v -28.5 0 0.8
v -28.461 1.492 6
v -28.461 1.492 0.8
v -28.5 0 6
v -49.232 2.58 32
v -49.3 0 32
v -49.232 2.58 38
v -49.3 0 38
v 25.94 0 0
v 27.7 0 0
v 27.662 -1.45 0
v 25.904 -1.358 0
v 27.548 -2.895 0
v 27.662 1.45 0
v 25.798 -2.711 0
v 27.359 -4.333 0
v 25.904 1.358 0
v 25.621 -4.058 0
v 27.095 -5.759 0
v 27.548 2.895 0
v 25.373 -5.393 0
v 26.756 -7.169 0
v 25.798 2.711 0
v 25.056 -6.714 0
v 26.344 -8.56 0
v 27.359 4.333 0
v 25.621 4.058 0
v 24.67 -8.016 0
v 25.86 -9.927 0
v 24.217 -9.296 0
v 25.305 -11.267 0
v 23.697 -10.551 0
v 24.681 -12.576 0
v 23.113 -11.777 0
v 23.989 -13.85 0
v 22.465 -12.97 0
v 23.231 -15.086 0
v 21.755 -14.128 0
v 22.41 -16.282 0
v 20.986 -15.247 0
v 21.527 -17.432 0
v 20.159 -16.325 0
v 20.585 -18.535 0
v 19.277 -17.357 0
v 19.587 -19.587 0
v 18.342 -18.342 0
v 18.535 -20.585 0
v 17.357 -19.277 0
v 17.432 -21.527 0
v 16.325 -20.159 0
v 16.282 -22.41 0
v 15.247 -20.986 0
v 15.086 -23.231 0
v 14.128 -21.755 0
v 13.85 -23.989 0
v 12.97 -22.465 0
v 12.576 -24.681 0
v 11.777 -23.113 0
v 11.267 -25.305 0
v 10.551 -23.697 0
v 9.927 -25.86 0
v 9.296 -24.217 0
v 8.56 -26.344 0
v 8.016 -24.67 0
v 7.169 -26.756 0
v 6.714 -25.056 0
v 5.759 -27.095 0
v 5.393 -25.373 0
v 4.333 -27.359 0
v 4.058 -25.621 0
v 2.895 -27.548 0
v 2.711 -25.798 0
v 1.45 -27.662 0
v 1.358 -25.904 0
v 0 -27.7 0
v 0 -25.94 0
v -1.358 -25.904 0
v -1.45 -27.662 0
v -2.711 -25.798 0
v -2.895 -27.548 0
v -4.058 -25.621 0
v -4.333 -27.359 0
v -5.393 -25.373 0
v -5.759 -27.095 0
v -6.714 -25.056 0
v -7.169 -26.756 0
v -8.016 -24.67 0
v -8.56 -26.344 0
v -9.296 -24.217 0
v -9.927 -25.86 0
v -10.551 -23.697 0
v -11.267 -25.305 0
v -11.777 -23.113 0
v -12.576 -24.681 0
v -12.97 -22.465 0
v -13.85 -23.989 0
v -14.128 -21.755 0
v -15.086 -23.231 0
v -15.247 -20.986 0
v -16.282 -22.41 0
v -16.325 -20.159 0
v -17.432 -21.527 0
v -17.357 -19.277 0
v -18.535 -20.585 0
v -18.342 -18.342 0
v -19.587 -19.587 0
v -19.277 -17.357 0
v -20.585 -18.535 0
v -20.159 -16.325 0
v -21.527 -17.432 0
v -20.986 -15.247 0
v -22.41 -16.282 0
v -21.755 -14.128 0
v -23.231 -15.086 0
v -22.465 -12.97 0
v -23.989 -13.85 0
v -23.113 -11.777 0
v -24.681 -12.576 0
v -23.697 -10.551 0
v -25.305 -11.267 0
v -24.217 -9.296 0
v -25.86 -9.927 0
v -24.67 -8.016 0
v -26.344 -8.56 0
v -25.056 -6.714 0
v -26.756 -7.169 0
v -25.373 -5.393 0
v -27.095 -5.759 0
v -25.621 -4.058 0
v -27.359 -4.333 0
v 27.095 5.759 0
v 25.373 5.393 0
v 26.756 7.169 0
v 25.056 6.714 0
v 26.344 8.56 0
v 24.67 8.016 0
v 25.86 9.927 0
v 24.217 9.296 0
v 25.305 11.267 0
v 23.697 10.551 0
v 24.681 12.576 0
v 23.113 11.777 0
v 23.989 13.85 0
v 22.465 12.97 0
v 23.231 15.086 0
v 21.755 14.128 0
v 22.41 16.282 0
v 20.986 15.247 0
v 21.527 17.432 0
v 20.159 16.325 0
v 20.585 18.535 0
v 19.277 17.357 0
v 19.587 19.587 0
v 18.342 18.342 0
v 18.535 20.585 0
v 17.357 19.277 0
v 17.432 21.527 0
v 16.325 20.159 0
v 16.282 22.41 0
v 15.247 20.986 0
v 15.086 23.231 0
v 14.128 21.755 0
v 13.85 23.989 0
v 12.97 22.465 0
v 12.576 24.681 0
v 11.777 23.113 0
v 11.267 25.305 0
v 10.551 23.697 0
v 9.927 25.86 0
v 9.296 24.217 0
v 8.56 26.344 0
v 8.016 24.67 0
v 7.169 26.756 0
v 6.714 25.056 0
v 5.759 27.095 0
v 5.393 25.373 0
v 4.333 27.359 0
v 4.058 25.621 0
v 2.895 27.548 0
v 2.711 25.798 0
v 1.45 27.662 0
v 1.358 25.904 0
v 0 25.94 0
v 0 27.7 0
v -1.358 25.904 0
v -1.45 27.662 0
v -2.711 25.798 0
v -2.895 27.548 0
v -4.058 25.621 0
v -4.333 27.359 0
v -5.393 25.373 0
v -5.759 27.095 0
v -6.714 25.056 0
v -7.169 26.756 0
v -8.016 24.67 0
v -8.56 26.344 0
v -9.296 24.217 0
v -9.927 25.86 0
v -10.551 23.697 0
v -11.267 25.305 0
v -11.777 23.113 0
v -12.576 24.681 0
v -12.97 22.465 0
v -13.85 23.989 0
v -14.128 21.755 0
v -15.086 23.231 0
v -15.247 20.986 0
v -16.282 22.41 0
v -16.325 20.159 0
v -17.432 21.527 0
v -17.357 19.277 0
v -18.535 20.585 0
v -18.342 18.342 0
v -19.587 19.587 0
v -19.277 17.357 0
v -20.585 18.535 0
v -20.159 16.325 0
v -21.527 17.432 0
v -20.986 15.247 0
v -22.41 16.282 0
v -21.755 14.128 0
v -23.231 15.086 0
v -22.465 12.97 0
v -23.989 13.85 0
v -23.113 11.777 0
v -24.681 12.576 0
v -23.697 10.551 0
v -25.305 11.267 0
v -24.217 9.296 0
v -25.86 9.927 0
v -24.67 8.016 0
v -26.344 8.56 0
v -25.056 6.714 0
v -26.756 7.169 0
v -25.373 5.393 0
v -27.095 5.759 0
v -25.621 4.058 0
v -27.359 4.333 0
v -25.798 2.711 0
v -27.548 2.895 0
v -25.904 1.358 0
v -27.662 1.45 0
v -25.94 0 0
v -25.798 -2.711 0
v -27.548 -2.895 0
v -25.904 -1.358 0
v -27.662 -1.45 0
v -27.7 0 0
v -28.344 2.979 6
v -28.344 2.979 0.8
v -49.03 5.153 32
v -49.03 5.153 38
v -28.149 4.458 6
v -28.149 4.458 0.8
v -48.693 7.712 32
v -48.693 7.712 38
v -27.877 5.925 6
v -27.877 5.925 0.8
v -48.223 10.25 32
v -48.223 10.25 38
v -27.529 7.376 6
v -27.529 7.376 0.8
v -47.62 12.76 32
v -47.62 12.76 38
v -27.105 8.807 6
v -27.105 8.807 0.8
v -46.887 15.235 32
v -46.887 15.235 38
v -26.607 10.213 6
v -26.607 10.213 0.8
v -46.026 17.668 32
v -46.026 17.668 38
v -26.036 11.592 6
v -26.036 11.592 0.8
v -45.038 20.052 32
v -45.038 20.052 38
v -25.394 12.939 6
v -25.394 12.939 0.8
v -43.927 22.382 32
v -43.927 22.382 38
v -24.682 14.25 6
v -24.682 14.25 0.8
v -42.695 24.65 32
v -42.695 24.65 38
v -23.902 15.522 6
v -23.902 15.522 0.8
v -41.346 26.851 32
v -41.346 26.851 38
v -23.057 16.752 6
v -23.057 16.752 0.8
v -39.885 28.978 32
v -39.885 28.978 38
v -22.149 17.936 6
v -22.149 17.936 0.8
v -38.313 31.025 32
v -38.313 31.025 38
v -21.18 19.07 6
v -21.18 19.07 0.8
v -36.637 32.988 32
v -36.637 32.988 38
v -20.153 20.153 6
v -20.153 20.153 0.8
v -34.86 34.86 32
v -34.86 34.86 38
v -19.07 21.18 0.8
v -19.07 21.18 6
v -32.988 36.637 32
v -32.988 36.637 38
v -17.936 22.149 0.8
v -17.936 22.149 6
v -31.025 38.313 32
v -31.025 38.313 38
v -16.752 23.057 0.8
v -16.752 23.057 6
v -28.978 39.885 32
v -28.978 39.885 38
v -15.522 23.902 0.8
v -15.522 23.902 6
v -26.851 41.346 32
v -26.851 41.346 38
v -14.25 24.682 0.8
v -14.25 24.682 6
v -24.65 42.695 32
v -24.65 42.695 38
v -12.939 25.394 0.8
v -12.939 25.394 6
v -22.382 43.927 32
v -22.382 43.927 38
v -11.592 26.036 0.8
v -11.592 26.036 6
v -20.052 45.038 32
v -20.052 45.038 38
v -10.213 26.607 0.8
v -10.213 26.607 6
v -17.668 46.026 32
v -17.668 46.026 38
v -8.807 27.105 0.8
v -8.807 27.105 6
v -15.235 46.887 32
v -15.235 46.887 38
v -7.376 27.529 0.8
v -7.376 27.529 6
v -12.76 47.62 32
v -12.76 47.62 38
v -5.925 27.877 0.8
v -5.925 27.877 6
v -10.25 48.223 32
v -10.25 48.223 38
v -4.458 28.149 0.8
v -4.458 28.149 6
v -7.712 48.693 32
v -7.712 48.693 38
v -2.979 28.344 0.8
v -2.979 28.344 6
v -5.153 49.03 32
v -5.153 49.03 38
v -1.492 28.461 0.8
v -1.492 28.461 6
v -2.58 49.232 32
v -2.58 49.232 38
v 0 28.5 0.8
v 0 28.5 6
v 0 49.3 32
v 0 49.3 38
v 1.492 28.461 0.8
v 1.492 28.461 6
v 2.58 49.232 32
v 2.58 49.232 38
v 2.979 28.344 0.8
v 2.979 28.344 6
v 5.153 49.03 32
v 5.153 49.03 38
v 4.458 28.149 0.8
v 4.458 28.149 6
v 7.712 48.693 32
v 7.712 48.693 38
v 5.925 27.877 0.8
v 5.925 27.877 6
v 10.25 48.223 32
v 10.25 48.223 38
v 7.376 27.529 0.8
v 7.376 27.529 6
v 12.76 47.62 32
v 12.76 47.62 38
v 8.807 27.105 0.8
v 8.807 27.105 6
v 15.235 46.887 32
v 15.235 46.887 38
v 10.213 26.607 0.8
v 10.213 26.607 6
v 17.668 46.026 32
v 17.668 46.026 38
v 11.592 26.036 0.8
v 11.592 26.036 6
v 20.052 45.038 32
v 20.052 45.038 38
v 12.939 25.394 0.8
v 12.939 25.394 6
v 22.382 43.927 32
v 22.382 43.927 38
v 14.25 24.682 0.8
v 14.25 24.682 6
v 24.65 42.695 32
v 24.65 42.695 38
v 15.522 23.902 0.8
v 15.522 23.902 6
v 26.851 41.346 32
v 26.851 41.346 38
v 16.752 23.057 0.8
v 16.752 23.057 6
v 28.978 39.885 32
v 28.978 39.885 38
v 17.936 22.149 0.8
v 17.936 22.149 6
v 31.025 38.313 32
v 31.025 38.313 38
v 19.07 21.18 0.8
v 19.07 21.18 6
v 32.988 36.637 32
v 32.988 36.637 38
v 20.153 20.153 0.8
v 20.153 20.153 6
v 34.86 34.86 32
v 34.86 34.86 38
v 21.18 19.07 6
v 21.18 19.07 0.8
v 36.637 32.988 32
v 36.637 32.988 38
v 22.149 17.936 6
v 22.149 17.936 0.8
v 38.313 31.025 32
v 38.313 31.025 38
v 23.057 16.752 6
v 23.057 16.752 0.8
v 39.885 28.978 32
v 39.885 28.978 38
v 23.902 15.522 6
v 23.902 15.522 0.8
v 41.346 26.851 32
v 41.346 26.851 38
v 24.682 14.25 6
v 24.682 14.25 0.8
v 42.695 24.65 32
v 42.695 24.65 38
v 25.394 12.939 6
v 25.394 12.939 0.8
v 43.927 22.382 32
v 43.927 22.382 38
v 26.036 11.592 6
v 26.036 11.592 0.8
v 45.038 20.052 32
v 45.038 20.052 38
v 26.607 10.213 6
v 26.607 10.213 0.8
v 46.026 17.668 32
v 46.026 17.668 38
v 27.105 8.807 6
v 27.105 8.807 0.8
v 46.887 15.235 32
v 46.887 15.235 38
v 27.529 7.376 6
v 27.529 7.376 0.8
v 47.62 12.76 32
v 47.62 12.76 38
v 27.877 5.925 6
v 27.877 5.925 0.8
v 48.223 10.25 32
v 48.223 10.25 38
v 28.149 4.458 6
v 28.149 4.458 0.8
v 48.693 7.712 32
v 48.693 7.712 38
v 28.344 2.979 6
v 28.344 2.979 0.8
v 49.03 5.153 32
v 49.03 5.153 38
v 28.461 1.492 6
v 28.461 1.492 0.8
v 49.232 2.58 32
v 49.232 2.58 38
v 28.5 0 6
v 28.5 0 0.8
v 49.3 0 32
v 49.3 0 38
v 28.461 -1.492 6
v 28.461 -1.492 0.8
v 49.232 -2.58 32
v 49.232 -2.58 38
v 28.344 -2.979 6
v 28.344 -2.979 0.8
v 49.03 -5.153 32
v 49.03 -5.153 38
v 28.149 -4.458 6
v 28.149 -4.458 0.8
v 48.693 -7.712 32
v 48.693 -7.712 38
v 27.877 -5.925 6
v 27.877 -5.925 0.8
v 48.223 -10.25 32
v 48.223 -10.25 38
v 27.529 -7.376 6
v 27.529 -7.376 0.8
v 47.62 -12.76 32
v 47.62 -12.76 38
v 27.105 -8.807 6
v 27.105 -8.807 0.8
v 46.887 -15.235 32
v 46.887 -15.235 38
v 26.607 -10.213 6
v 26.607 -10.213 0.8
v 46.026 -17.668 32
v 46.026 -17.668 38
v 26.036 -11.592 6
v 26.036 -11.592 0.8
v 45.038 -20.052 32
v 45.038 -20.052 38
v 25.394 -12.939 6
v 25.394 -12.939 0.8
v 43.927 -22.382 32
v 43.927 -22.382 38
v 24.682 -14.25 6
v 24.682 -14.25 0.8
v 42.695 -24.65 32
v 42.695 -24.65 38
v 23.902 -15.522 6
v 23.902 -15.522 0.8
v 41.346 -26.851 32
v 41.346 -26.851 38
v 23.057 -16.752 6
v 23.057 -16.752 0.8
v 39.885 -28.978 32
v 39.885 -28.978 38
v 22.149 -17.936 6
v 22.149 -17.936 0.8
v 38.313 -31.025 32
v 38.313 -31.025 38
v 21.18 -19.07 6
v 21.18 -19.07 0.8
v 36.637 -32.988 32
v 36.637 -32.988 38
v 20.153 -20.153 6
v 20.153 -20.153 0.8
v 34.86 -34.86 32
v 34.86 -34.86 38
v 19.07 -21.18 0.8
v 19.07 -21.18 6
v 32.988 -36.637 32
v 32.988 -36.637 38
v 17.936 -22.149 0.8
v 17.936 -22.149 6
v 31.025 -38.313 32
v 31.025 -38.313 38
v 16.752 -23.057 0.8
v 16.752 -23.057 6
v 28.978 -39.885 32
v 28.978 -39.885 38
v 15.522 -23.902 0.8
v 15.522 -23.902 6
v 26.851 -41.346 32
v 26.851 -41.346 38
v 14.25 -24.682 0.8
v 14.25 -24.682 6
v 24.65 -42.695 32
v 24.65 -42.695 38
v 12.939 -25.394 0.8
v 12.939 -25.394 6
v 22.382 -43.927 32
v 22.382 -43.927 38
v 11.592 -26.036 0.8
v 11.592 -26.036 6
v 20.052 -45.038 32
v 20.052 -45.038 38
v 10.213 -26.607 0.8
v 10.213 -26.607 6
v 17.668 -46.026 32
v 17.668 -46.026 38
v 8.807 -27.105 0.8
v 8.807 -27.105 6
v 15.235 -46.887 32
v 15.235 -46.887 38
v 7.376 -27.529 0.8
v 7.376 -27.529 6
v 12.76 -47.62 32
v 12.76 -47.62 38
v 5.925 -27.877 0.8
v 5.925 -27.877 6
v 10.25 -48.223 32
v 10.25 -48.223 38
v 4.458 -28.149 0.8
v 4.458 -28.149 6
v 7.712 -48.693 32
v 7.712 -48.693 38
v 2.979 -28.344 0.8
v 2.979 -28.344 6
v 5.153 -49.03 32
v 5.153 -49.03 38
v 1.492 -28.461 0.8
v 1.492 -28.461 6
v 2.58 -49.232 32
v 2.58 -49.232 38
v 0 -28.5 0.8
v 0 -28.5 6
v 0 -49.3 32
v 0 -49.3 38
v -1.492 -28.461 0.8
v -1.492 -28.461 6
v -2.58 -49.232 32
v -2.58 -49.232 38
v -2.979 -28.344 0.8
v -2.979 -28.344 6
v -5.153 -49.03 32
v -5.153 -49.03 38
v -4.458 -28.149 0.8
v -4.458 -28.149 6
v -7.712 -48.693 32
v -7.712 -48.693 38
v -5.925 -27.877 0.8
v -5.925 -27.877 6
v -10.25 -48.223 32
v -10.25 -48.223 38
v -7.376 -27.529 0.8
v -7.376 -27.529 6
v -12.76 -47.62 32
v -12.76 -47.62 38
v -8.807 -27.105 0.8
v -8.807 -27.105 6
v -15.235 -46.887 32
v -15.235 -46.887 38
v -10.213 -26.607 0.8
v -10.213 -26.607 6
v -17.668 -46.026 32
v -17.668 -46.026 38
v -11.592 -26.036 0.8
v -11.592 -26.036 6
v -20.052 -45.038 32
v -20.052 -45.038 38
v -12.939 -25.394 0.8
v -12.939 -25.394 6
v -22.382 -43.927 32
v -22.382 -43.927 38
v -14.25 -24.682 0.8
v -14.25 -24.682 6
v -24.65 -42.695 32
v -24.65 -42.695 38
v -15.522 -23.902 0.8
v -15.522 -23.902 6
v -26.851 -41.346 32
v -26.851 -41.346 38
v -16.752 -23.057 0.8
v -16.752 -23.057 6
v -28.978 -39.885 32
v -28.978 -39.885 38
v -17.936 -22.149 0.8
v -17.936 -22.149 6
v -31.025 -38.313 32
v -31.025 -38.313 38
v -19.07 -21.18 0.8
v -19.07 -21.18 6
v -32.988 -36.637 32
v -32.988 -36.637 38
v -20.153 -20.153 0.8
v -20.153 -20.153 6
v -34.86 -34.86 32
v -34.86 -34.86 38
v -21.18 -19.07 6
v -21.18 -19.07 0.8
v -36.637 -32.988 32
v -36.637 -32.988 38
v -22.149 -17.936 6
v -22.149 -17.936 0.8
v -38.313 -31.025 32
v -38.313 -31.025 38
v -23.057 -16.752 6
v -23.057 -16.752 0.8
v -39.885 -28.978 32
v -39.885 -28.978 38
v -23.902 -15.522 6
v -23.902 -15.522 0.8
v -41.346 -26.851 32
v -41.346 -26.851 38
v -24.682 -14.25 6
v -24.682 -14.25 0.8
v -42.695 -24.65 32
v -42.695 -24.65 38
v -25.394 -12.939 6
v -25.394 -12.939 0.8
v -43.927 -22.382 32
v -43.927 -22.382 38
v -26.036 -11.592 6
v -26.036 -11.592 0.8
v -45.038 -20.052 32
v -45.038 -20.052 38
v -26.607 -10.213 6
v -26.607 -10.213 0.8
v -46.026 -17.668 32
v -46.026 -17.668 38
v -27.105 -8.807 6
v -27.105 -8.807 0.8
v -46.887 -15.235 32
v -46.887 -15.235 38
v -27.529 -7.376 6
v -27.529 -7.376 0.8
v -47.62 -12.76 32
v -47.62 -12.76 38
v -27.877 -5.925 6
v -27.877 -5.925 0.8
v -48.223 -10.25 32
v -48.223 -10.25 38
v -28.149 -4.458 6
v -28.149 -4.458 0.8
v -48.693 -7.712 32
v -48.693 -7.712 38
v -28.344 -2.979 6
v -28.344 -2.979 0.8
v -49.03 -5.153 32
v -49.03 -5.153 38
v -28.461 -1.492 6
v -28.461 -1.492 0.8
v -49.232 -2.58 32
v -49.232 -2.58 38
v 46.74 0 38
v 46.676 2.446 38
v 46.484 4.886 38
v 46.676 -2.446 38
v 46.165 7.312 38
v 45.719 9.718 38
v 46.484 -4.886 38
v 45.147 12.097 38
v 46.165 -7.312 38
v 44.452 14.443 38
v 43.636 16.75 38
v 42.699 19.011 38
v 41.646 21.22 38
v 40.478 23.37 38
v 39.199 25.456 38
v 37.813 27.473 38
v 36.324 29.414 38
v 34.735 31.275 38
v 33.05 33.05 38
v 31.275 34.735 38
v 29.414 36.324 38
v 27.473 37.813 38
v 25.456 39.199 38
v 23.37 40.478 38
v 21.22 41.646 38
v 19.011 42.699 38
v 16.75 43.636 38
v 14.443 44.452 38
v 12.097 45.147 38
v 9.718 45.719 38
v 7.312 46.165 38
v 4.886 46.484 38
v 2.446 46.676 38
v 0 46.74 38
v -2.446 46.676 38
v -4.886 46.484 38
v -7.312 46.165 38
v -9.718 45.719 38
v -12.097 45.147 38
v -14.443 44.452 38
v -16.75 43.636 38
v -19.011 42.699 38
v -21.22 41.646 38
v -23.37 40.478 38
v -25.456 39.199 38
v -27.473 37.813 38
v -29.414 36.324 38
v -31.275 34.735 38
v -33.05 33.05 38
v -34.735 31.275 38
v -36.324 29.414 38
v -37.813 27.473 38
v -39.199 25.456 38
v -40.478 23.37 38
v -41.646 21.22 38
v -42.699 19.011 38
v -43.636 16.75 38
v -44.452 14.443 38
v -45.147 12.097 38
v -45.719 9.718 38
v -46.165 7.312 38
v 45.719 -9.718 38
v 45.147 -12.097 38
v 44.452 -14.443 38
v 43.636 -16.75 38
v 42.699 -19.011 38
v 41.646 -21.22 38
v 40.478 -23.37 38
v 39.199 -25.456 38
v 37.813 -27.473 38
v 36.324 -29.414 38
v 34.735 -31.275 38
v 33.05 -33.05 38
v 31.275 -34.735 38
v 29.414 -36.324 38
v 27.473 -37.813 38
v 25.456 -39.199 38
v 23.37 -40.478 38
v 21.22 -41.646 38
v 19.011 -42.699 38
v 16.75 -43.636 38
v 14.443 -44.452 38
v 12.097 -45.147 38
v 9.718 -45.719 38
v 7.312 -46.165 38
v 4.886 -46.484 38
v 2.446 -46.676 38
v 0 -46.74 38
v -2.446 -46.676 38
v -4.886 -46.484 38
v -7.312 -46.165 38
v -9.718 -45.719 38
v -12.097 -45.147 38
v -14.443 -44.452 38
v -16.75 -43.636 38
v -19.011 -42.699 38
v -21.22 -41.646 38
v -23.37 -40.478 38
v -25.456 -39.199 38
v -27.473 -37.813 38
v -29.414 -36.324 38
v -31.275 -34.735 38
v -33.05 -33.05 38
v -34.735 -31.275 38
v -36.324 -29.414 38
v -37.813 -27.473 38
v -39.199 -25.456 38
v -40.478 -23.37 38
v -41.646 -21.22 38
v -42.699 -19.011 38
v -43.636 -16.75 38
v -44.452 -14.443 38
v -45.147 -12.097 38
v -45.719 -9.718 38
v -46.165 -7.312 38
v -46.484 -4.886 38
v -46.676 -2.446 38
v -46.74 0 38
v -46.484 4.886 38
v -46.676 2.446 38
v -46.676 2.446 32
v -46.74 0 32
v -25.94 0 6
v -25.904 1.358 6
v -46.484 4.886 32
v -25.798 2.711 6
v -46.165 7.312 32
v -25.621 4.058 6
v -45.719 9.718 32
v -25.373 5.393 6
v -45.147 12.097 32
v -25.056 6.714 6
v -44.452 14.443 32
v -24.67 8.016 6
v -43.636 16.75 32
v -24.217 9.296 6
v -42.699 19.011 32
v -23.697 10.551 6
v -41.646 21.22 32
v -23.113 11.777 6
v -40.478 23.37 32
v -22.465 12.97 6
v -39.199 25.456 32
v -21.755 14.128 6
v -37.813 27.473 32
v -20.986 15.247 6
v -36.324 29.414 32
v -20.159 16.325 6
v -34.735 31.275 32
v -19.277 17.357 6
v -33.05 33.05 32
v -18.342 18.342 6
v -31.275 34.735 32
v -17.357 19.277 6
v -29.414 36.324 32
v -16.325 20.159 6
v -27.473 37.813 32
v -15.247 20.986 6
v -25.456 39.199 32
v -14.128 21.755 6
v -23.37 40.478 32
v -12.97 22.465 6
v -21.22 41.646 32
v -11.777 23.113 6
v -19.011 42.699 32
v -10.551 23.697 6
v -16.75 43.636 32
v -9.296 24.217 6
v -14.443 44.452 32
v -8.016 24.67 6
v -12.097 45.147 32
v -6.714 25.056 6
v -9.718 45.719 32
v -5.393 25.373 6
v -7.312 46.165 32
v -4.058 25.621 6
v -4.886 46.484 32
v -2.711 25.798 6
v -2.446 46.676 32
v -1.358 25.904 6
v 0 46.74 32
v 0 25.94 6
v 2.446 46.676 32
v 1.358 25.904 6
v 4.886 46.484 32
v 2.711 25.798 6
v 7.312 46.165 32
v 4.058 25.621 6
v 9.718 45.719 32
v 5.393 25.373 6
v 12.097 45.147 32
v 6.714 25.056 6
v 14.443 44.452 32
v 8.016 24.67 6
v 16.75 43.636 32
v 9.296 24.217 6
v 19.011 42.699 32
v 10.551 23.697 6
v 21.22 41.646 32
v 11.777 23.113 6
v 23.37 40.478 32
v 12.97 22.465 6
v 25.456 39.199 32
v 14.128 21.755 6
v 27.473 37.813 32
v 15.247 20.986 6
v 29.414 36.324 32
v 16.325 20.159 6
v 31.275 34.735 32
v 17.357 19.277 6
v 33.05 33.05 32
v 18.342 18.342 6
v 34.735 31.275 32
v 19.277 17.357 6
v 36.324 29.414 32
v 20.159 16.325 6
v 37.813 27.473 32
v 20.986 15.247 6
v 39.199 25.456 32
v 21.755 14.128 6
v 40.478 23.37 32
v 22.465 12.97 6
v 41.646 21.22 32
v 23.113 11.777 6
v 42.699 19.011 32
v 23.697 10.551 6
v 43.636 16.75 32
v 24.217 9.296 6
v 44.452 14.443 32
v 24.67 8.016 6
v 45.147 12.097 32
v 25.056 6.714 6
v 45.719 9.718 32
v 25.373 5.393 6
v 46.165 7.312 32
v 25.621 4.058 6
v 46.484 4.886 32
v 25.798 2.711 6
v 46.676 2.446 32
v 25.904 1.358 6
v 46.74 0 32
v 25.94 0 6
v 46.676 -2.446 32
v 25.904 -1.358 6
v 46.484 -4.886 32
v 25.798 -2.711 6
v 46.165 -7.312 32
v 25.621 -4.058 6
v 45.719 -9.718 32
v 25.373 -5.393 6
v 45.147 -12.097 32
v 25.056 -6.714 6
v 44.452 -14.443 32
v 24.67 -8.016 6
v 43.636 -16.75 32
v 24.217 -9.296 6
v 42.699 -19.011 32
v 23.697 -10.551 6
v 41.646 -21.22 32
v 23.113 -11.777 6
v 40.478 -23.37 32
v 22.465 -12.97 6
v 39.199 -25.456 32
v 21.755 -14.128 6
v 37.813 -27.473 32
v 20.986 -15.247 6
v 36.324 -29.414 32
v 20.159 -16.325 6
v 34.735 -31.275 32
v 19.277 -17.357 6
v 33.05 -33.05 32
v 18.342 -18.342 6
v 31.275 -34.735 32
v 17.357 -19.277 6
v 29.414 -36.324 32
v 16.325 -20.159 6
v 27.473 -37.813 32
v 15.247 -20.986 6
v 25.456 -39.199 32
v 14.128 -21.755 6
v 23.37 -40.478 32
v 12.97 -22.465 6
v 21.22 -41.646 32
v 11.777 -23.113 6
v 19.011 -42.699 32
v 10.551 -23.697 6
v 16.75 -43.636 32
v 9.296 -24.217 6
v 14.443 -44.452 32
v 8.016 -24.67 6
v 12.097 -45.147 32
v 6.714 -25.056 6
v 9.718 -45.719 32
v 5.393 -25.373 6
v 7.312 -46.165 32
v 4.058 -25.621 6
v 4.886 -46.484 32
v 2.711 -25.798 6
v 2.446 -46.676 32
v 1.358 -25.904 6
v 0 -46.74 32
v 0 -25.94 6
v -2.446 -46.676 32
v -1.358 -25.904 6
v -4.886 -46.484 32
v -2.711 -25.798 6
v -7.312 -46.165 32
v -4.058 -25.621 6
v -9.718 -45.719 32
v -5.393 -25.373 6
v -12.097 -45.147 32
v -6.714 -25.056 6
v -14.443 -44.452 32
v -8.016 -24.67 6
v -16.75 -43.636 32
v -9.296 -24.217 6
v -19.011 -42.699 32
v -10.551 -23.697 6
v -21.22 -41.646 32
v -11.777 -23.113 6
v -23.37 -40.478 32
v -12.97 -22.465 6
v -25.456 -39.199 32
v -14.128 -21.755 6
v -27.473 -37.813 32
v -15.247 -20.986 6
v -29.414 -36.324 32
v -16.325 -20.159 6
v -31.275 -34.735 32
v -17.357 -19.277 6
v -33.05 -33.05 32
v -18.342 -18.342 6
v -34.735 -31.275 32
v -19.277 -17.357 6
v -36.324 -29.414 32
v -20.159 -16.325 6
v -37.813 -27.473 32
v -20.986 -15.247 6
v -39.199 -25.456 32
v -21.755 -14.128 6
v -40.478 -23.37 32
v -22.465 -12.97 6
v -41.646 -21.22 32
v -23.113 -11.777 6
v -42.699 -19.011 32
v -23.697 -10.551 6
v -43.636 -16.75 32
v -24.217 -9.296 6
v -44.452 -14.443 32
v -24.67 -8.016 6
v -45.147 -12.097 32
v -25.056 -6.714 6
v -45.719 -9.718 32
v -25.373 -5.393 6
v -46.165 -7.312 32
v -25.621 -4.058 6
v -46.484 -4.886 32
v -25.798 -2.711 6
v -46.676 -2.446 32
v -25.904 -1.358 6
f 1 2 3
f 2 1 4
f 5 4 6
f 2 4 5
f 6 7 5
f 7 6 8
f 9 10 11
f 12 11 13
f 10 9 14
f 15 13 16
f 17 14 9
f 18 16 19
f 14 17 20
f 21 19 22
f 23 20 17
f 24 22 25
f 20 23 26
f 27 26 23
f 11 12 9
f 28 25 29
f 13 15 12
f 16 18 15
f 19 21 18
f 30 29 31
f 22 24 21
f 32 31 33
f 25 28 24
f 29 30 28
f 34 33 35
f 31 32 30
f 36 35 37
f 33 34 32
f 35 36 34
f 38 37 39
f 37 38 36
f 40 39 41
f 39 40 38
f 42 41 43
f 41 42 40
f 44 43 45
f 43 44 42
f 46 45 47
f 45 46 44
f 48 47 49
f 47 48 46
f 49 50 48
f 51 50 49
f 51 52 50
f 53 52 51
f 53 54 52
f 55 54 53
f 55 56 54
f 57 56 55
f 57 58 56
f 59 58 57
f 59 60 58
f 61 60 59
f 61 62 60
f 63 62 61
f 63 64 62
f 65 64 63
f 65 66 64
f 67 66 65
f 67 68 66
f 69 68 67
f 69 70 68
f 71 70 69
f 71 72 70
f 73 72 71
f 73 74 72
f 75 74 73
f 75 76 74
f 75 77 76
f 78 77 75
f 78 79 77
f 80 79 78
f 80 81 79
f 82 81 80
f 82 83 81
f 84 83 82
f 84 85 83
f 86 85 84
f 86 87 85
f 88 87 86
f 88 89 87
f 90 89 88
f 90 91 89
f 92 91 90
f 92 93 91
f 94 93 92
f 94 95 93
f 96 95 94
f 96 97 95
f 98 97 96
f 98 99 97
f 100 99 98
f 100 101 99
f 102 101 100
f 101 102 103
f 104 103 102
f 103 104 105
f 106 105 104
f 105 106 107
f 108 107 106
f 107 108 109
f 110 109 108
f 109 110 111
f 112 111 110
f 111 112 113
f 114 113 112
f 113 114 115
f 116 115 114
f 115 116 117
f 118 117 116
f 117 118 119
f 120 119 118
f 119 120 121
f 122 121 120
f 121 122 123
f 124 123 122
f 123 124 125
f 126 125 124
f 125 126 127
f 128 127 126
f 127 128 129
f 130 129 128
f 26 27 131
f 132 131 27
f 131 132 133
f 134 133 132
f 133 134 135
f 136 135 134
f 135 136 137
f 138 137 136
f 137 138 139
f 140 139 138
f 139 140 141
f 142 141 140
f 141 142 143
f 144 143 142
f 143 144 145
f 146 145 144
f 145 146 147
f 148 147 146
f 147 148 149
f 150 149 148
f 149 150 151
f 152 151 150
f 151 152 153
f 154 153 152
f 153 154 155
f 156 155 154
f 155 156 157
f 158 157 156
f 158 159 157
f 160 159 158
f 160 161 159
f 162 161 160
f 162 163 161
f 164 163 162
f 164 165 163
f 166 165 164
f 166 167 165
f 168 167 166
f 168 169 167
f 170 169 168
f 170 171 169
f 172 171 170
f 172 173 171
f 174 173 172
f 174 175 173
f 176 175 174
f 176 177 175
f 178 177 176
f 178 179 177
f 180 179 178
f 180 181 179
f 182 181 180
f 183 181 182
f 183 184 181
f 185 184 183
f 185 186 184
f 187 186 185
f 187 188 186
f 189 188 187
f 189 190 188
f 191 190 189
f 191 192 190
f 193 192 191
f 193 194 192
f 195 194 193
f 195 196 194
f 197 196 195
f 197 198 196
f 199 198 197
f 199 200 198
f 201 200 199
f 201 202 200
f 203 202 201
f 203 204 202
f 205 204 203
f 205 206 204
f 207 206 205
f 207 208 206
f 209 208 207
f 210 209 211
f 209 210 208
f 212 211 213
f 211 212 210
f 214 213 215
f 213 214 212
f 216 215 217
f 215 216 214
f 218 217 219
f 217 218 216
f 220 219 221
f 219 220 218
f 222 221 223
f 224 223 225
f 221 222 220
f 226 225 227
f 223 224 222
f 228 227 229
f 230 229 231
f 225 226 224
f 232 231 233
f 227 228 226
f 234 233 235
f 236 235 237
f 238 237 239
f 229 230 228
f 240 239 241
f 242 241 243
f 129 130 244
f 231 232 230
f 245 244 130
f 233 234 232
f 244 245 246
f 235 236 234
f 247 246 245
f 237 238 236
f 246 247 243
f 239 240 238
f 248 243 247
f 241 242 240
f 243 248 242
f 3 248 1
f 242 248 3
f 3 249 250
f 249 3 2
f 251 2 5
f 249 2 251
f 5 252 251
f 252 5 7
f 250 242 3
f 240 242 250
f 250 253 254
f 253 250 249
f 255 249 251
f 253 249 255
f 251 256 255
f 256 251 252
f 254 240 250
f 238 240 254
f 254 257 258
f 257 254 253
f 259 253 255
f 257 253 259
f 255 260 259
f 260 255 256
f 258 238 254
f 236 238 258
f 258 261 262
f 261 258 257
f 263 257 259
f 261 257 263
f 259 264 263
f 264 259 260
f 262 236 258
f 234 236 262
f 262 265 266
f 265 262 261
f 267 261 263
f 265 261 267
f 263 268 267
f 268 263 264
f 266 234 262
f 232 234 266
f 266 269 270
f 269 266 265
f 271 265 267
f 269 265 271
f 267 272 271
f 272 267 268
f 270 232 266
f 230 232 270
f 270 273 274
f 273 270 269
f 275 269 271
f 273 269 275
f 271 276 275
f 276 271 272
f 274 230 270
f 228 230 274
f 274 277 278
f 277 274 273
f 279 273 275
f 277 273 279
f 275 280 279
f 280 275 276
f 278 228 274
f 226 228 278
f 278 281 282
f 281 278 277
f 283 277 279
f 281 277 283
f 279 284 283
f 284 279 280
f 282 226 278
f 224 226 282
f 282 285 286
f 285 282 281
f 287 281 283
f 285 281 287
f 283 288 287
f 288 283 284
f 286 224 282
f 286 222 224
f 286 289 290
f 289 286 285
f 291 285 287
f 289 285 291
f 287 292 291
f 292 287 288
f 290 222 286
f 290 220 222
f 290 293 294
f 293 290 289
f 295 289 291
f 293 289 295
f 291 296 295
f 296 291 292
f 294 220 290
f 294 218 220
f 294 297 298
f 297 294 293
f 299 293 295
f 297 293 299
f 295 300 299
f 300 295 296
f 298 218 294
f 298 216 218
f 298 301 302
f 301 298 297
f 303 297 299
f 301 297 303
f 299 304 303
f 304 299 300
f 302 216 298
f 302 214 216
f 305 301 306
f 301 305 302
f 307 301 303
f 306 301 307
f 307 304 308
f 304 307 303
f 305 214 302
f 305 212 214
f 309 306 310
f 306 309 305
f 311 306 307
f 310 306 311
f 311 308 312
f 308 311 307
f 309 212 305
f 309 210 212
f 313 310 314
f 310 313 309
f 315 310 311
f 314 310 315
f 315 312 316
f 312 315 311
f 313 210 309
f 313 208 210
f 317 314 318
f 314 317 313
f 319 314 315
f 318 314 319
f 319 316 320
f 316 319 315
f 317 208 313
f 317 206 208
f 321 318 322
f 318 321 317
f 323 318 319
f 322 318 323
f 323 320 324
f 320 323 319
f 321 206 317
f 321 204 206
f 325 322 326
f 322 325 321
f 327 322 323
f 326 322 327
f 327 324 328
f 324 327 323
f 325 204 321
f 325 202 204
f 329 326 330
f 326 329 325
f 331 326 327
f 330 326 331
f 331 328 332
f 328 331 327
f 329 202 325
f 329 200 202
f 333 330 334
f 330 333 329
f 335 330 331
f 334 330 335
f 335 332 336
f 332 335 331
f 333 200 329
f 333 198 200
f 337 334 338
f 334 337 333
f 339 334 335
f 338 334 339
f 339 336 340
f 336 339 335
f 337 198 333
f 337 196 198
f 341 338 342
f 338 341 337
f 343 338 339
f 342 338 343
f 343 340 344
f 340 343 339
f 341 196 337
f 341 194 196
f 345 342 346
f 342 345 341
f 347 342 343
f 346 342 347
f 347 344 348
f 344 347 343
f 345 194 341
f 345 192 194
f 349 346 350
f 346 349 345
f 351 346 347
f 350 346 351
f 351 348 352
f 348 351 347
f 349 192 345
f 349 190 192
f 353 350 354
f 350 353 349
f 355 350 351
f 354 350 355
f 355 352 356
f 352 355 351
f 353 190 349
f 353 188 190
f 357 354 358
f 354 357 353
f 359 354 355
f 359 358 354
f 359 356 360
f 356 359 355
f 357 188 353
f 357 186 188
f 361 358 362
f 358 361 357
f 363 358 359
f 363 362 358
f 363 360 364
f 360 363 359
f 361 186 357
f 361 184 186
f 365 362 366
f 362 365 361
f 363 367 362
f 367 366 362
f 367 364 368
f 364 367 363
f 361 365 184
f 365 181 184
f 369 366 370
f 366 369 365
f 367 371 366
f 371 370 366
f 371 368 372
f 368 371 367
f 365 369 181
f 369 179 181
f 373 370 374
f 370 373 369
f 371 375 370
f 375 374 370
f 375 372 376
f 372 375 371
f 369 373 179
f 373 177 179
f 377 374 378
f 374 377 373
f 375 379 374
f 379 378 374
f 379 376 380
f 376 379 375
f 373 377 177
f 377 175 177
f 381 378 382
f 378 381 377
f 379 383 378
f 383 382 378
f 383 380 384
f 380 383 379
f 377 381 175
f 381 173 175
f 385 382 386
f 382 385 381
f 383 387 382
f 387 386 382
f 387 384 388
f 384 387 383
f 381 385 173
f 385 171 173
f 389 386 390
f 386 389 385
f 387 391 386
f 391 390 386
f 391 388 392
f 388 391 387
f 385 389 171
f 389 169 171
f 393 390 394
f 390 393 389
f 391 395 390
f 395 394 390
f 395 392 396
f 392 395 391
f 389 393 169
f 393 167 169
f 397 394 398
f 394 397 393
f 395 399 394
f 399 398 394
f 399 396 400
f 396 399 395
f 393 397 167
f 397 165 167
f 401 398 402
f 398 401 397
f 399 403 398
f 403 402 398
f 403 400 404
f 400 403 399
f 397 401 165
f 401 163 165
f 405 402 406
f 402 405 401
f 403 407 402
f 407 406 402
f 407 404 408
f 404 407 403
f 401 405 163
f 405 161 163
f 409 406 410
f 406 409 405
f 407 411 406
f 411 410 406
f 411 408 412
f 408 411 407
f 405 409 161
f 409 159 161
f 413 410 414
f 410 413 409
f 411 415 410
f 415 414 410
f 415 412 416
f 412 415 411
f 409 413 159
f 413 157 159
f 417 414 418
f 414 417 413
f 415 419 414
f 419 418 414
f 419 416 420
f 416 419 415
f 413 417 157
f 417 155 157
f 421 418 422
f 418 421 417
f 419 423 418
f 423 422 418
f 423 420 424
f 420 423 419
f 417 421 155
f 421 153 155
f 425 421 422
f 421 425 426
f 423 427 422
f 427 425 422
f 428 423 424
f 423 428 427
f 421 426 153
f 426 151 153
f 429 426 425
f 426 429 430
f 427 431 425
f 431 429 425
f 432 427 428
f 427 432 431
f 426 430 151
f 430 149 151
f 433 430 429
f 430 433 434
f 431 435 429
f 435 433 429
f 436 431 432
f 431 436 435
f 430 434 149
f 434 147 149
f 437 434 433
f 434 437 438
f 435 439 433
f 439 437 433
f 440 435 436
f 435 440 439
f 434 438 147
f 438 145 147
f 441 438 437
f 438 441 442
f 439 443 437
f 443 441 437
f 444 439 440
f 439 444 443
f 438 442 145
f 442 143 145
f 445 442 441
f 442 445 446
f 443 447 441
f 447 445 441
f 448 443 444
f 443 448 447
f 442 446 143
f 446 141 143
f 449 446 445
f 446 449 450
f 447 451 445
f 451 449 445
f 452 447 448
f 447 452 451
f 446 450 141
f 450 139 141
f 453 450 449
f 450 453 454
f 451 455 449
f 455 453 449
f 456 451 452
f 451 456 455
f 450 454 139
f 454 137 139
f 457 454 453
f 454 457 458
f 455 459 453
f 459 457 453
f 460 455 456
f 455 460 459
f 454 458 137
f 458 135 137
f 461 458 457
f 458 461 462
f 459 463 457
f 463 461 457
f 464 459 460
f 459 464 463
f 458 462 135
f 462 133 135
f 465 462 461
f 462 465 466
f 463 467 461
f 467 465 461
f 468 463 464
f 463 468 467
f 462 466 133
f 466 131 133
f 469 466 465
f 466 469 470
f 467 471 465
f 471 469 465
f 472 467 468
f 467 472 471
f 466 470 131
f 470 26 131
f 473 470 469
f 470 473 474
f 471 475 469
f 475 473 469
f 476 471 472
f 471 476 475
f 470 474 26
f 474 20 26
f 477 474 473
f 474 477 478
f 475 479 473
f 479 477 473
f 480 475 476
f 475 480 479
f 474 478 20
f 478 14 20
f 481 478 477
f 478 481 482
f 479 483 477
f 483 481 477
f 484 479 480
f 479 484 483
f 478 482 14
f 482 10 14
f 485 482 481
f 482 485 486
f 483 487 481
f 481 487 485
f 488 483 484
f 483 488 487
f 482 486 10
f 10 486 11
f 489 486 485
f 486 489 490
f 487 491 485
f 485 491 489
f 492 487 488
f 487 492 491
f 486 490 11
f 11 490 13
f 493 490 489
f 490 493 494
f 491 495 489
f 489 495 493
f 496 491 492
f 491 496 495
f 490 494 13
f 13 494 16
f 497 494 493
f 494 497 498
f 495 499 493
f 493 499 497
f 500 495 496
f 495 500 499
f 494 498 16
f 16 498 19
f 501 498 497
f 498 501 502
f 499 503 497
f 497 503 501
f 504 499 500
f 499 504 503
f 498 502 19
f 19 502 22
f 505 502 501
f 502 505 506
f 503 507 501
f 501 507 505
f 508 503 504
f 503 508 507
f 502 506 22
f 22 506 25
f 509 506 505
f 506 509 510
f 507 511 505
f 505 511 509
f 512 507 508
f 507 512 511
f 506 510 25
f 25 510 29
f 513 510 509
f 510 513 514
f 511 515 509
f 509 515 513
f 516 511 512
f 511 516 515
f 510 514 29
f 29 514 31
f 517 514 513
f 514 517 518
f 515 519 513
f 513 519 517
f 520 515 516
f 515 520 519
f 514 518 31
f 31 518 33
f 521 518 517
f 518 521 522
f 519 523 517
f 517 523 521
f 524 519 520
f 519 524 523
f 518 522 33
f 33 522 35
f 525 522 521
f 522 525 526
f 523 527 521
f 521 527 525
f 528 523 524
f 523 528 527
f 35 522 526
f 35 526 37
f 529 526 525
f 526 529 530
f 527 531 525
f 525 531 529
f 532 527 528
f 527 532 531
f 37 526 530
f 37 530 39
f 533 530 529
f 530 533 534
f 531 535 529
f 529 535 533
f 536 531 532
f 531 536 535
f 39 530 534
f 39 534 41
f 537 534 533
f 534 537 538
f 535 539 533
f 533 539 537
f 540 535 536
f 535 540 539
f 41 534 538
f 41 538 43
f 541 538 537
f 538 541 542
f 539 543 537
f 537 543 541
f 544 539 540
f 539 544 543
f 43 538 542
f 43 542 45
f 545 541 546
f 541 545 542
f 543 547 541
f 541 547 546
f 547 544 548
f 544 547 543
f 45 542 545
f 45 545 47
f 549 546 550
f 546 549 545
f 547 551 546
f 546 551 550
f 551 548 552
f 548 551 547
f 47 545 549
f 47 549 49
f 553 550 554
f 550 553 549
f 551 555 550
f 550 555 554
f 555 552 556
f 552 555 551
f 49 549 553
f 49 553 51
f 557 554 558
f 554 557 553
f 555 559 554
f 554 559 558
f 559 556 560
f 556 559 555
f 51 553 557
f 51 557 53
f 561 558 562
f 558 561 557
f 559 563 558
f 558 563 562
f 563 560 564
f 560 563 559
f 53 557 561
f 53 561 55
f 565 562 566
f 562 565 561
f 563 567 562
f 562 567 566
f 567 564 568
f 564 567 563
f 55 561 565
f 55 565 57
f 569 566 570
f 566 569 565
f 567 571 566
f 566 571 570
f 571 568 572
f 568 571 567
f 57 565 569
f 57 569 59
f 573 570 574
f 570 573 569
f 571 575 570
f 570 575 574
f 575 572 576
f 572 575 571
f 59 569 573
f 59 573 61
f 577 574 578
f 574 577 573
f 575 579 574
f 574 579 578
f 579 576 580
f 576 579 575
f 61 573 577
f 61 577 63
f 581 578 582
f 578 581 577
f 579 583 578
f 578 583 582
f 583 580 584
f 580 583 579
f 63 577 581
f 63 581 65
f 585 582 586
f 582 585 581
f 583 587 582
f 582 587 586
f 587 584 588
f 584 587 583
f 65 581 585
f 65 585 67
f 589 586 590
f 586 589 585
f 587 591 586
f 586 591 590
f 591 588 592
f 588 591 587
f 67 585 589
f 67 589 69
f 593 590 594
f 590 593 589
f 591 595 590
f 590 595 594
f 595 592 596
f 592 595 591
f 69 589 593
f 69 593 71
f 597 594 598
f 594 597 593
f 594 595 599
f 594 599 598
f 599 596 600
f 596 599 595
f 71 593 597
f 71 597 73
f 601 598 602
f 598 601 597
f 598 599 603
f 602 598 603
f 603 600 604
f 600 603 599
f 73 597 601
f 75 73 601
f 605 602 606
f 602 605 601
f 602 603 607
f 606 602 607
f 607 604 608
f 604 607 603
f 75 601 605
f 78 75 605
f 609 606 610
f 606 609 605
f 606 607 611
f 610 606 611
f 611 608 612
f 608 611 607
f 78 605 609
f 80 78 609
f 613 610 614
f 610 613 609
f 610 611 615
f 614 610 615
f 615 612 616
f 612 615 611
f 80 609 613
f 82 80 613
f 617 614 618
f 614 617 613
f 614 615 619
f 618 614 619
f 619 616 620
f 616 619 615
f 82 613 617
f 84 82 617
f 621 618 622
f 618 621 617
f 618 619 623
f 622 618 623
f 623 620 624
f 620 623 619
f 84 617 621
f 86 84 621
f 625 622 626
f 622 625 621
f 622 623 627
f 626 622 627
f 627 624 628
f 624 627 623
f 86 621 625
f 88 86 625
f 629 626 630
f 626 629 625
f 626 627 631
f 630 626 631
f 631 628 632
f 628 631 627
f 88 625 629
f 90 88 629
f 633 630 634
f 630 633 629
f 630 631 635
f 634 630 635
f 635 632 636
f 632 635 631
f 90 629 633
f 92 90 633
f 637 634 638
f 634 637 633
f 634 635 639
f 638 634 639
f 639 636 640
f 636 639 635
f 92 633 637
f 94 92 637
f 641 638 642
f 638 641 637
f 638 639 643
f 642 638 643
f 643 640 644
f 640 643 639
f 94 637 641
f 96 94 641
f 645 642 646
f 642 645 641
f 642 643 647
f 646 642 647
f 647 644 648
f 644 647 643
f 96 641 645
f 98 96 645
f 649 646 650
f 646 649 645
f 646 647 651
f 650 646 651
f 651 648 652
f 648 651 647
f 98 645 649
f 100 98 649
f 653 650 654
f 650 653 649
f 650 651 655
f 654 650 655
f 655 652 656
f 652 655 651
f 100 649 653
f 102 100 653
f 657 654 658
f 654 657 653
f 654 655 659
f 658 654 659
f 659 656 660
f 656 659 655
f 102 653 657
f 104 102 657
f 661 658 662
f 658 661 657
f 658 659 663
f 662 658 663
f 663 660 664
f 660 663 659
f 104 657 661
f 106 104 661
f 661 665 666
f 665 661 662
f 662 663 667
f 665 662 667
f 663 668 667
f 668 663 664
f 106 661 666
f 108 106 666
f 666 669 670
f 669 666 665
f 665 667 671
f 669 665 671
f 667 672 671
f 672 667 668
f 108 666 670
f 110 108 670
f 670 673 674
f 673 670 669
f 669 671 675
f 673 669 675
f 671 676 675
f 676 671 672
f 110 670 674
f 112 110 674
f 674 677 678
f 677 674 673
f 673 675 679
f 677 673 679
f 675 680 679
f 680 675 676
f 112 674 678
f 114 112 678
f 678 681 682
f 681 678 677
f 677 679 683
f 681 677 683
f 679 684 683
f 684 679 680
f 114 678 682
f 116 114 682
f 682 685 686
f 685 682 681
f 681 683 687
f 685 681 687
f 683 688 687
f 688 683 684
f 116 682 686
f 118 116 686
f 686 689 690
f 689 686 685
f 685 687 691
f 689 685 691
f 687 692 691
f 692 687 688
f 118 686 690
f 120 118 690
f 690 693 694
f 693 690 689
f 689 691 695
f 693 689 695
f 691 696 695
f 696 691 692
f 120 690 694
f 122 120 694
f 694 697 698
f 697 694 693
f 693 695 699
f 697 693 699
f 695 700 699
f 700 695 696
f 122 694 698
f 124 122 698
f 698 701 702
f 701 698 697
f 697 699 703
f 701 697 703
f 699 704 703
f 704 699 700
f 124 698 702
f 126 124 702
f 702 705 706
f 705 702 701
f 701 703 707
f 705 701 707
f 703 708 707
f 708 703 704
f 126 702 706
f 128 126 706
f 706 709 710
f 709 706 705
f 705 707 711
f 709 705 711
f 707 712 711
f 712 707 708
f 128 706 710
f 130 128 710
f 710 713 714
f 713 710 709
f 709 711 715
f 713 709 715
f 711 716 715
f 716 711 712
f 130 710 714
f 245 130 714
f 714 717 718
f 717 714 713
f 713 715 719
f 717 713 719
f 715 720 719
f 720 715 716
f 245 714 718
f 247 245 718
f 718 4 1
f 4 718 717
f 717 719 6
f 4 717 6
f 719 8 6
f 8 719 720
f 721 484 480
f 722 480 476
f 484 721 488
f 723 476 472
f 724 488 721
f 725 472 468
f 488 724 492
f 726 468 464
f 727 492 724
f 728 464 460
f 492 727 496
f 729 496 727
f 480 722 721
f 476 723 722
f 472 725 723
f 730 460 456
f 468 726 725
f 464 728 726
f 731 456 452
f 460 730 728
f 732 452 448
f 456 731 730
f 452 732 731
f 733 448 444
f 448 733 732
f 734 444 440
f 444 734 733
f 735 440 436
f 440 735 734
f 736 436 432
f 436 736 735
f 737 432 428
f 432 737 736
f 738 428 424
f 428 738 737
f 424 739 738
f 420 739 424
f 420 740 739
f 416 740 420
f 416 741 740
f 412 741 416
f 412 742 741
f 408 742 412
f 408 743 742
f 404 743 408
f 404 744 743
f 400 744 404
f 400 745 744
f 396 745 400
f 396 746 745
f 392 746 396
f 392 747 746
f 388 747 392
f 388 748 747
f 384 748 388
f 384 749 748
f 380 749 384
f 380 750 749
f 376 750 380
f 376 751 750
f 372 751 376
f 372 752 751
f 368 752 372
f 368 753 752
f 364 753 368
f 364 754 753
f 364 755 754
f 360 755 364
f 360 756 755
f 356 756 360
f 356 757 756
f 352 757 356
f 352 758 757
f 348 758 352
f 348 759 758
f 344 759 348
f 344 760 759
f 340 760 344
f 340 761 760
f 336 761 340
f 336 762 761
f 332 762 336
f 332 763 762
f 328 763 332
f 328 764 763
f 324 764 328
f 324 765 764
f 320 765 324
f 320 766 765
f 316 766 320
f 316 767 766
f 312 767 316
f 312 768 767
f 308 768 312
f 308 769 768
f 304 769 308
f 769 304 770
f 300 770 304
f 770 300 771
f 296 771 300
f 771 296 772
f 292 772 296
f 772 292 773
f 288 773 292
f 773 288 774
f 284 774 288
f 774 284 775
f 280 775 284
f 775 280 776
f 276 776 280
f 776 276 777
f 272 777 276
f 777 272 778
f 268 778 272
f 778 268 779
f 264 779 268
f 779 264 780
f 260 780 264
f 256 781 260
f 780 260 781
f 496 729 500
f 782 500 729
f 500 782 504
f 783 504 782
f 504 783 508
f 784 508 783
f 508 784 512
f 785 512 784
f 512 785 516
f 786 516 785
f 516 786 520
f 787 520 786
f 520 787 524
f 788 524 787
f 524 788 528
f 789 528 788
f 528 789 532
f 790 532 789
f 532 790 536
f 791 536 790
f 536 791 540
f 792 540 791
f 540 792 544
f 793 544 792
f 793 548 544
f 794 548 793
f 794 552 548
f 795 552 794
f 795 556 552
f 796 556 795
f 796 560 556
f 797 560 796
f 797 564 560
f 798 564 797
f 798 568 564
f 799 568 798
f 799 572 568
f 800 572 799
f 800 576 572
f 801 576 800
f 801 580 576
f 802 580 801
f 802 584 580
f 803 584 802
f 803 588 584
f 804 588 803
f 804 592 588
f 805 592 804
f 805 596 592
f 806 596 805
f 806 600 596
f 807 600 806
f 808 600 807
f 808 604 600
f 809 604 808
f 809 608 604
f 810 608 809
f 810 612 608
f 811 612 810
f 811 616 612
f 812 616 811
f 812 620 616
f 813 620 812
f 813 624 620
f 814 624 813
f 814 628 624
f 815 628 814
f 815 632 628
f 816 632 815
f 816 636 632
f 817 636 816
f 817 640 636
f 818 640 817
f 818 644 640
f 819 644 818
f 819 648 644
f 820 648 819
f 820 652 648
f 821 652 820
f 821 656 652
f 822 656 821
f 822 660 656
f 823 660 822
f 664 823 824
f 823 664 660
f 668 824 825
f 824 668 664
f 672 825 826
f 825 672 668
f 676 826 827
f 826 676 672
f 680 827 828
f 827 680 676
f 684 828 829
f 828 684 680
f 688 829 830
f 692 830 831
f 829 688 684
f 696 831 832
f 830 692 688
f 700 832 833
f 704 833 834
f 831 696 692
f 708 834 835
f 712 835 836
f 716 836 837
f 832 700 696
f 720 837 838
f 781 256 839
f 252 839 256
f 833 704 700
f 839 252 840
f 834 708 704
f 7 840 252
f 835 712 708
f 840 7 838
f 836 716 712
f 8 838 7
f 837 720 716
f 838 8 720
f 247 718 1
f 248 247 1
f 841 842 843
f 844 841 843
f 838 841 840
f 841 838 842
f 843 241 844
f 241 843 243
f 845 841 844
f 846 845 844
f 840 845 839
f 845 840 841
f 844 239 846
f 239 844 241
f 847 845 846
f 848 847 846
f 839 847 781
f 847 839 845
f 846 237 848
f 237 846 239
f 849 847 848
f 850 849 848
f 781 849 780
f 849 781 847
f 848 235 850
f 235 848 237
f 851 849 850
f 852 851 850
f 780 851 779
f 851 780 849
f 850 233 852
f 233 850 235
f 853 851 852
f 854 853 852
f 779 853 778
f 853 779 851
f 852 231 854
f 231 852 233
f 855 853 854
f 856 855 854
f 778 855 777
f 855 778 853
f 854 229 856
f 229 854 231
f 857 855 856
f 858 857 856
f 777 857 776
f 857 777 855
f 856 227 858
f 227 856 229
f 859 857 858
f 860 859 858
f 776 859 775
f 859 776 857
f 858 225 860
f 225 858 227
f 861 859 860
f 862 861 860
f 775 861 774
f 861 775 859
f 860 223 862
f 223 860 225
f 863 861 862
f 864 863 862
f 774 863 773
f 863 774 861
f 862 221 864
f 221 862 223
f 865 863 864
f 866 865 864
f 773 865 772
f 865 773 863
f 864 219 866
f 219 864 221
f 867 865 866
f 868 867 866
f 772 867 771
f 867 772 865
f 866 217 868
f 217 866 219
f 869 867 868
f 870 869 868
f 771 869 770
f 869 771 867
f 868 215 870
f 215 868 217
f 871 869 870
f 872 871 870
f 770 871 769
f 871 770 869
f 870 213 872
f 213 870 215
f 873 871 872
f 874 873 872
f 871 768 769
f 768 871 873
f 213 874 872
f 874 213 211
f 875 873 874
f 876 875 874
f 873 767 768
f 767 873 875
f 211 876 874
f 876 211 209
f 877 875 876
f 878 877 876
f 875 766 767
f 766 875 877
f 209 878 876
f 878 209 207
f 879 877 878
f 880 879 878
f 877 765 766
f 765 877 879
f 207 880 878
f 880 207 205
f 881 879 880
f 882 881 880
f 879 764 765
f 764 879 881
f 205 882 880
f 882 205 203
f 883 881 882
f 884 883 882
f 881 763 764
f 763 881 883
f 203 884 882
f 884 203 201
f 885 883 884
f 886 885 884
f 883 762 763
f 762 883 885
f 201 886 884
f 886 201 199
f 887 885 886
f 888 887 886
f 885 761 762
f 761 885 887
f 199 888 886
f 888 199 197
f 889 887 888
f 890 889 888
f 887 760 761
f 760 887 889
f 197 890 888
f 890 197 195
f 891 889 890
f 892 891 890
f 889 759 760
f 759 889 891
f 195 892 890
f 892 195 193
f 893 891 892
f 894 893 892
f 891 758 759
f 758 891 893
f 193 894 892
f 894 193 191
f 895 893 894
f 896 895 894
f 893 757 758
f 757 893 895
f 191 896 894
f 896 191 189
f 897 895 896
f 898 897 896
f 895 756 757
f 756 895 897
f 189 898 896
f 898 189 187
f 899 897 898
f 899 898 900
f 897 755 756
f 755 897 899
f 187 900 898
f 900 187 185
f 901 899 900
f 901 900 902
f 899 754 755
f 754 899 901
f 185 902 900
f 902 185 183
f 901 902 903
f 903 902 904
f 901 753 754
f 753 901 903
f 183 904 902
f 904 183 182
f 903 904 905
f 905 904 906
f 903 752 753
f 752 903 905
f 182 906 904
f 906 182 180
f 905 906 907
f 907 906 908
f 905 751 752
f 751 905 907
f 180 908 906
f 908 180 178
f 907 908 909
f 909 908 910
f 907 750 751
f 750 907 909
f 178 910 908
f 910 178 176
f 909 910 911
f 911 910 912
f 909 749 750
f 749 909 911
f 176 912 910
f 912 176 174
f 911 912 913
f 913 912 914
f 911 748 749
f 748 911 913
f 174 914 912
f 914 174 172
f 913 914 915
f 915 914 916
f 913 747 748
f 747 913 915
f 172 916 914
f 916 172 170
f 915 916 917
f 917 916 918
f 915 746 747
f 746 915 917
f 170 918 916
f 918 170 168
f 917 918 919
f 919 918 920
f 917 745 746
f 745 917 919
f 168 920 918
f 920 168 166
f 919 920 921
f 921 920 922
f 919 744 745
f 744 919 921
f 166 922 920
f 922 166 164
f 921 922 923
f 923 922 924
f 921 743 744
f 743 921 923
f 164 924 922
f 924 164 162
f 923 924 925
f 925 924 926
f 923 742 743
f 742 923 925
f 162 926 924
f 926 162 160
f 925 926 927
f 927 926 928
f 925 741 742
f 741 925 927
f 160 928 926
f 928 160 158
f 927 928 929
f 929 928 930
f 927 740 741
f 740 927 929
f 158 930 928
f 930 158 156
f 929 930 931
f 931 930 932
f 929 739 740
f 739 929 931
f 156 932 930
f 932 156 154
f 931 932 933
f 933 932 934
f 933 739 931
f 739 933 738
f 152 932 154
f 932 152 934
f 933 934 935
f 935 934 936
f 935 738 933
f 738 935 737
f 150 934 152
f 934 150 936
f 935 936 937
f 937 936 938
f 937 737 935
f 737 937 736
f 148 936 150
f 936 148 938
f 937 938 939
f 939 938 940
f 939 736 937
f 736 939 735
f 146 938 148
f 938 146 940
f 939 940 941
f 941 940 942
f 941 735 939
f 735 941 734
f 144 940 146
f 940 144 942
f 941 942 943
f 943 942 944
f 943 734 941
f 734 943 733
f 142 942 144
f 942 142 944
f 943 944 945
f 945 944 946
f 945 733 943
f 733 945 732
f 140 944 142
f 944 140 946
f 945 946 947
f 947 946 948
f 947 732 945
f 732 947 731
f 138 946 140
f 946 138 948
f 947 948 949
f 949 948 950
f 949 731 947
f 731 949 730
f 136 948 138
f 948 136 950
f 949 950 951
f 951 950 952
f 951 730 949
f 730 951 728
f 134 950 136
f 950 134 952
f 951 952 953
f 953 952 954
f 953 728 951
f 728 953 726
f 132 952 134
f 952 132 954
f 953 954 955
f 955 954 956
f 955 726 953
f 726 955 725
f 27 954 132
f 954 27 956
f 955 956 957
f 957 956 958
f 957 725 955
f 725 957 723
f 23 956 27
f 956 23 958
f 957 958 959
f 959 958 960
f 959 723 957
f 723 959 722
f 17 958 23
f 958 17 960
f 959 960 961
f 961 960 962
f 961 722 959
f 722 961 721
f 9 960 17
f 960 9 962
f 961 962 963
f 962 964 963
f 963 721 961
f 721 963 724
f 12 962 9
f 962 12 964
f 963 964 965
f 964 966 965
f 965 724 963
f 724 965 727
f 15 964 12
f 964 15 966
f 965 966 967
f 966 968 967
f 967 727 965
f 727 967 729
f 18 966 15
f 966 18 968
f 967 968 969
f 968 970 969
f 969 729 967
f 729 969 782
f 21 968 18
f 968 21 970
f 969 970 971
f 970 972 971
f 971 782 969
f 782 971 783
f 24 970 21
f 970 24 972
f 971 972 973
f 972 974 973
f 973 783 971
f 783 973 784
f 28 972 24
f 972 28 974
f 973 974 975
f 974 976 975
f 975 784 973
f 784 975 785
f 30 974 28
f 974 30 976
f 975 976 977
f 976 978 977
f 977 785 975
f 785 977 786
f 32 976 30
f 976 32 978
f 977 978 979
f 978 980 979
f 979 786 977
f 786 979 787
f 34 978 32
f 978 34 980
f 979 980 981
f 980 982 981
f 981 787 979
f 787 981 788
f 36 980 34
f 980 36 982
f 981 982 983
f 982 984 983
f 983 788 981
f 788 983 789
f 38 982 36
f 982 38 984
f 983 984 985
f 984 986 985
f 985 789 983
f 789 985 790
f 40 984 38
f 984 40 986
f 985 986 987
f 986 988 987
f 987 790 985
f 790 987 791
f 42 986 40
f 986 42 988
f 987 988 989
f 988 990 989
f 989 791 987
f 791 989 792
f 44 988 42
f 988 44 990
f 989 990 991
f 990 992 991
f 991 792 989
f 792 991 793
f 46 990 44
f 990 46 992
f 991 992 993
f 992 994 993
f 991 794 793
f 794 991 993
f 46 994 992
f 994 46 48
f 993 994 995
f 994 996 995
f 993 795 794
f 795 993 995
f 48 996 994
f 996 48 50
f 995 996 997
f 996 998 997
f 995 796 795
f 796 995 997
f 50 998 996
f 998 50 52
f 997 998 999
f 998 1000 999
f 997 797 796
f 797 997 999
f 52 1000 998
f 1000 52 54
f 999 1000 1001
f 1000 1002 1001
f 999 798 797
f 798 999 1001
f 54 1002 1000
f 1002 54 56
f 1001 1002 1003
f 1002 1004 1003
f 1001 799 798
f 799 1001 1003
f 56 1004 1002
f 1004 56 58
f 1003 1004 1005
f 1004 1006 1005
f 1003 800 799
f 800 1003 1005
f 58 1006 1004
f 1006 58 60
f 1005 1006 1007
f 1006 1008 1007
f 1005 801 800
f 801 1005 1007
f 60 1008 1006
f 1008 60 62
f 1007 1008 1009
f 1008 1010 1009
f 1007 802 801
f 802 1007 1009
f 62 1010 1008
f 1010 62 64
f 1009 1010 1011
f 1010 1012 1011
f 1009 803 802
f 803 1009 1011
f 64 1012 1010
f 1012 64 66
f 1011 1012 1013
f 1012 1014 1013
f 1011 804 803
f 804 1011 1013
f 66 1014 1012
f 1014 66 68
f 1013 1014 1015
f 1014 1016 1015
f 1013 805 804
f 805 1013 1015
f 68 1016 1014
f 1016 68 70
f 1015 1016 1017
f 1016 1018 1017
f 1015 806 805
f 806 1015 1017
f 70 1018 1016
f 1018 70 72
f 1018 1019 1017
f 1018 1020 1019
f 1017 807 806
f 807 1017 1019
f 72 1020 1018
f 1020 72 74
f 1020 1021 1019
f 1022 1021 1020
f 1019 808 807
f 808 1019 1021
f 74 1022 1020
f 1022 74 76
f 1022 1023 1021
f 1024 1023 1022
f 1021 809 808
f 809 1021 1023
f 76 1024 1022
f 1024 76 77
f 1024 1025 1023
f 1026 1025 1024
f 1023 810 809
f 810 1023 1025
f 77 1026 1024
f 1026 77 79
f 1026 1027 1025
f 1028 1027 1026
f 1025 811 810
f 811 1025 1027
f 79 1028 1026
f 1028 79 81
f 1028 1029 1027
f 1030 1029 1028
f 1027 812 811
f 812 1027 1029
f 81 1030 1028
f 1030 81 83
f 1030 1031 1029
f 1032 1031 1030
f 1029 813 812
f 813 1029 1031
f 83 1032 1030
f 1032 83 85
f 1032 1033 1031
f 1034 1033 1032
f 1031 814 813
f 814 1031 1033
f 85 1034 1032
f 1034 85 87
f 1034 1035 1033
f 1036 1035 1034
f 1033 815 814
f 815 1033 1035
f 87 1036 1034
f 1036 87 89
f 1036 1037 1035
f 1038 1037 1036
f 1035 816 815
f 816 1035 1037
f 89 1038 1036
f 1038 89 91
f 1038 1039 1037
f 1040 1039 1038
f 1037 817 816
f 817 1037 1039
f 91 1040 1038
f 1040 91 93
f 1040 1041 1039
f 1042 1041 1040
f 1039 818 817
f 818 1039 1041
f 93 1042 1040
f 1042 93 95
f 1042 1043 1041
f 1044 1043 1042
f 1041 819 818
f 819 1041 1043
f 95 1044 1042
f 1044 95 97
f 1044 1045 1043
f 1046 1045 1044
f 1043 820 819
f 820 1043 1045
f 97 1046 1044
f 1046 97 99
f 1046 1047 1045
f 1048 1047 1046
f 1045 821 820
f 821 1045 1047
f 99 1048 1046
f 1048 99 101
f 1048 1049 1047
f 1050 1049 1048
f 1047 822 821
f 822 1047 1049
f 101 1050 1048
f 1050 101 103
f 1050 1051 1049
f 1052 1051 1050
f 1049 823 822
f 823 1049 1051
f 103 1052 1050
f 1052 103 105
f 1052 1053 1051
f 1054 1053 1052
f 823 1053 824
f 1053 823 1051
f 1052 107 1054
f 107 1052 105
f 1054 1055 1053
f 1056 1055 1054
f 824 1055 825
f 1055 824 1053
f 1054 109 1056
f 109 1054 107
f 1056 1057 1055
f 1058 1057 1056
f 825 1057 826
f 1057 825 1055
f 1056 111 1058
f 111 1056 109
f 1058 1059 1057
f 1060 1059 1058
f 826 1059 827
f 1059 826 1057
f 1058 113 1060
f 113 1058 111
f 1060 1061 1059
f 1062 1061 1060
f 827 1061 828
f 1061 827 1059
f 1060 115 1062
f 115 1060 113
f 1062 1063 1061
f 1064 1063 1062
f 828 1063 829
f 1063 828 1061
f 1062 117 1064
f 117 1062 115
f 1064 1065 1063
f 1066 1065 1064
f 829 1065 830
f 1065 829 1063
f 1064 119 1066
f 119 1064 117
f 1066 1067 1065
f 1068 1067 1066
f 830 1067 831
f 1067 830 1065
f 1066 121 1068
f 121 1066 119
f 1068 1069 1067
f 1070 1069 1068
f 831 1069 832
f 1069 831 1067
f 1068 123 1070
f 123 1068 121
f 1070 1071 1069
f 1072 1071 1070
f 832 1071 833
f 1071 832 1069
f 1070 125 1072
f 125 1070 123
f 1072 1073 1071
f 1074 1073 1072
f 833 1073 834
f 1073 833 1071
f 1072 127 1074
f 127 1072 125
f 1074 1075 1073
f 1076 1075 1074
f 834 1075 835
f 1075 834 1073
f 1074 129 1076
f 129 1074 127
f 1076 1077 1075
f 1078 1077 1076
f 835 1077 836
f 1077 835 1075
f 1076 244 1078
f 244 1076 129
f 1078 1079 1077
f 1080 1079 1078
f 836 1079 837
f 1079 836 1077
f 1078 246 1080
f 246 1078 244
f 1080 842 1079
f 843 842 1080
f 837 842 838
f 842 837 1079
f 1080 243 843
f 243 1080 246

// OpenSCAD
// Espresso dosing funnel for 51 / 53 / 54 / 58 mm portafilters - original design (Brian Sacco)
// A plug ring drops into the basket, a 45-degree seat rests on the basket edge and a wide hopper catches the grounds.
// Prints standing on the plug ring: the hopper leans out at 39 degrees from vertical, so no supports.
basket   = 58;     // nominal portafilter size (mm): 51, 53, 54 or 58
plug_h   = 6;      // plug ring height that goes into the basket
cone_h   = 26;     // hopper height (the cone)
collar_h = 6;      // straight collar at the top, for stiffness
flare    = 0.8;    // hopper growth per mm of height (0.8 = 39 deg from vertical)
under    = 1.0;    // plug ring is this much under the nominal size so it always drops in
wall     = 2.56;   // radial wall (about 2 mm measured perpendicular to the cone)
$fn = 120;

ro = (basket - under) / 2;
ri = ro - wall;
total = plug_h + cone_h + collar_h;
rt = ro + flare * cone_h;

outer = [[0, 0], [ro - 0.8, 0], [ro, 0.8], [ro, plug_h], [rt, plug_h + cone_h], [rt, total], [0, total]];
inner = [[0, -1], [ri, -1], [ri, plug_h], [ri + flare * cone_h, plug_h + cone_h], [ri + flare * cone_h, total + 1], [0, total + 1]];

difference() {
    rotate_extrude() polygon(outer);
    rotate_extrude() polygon(inner);
}
